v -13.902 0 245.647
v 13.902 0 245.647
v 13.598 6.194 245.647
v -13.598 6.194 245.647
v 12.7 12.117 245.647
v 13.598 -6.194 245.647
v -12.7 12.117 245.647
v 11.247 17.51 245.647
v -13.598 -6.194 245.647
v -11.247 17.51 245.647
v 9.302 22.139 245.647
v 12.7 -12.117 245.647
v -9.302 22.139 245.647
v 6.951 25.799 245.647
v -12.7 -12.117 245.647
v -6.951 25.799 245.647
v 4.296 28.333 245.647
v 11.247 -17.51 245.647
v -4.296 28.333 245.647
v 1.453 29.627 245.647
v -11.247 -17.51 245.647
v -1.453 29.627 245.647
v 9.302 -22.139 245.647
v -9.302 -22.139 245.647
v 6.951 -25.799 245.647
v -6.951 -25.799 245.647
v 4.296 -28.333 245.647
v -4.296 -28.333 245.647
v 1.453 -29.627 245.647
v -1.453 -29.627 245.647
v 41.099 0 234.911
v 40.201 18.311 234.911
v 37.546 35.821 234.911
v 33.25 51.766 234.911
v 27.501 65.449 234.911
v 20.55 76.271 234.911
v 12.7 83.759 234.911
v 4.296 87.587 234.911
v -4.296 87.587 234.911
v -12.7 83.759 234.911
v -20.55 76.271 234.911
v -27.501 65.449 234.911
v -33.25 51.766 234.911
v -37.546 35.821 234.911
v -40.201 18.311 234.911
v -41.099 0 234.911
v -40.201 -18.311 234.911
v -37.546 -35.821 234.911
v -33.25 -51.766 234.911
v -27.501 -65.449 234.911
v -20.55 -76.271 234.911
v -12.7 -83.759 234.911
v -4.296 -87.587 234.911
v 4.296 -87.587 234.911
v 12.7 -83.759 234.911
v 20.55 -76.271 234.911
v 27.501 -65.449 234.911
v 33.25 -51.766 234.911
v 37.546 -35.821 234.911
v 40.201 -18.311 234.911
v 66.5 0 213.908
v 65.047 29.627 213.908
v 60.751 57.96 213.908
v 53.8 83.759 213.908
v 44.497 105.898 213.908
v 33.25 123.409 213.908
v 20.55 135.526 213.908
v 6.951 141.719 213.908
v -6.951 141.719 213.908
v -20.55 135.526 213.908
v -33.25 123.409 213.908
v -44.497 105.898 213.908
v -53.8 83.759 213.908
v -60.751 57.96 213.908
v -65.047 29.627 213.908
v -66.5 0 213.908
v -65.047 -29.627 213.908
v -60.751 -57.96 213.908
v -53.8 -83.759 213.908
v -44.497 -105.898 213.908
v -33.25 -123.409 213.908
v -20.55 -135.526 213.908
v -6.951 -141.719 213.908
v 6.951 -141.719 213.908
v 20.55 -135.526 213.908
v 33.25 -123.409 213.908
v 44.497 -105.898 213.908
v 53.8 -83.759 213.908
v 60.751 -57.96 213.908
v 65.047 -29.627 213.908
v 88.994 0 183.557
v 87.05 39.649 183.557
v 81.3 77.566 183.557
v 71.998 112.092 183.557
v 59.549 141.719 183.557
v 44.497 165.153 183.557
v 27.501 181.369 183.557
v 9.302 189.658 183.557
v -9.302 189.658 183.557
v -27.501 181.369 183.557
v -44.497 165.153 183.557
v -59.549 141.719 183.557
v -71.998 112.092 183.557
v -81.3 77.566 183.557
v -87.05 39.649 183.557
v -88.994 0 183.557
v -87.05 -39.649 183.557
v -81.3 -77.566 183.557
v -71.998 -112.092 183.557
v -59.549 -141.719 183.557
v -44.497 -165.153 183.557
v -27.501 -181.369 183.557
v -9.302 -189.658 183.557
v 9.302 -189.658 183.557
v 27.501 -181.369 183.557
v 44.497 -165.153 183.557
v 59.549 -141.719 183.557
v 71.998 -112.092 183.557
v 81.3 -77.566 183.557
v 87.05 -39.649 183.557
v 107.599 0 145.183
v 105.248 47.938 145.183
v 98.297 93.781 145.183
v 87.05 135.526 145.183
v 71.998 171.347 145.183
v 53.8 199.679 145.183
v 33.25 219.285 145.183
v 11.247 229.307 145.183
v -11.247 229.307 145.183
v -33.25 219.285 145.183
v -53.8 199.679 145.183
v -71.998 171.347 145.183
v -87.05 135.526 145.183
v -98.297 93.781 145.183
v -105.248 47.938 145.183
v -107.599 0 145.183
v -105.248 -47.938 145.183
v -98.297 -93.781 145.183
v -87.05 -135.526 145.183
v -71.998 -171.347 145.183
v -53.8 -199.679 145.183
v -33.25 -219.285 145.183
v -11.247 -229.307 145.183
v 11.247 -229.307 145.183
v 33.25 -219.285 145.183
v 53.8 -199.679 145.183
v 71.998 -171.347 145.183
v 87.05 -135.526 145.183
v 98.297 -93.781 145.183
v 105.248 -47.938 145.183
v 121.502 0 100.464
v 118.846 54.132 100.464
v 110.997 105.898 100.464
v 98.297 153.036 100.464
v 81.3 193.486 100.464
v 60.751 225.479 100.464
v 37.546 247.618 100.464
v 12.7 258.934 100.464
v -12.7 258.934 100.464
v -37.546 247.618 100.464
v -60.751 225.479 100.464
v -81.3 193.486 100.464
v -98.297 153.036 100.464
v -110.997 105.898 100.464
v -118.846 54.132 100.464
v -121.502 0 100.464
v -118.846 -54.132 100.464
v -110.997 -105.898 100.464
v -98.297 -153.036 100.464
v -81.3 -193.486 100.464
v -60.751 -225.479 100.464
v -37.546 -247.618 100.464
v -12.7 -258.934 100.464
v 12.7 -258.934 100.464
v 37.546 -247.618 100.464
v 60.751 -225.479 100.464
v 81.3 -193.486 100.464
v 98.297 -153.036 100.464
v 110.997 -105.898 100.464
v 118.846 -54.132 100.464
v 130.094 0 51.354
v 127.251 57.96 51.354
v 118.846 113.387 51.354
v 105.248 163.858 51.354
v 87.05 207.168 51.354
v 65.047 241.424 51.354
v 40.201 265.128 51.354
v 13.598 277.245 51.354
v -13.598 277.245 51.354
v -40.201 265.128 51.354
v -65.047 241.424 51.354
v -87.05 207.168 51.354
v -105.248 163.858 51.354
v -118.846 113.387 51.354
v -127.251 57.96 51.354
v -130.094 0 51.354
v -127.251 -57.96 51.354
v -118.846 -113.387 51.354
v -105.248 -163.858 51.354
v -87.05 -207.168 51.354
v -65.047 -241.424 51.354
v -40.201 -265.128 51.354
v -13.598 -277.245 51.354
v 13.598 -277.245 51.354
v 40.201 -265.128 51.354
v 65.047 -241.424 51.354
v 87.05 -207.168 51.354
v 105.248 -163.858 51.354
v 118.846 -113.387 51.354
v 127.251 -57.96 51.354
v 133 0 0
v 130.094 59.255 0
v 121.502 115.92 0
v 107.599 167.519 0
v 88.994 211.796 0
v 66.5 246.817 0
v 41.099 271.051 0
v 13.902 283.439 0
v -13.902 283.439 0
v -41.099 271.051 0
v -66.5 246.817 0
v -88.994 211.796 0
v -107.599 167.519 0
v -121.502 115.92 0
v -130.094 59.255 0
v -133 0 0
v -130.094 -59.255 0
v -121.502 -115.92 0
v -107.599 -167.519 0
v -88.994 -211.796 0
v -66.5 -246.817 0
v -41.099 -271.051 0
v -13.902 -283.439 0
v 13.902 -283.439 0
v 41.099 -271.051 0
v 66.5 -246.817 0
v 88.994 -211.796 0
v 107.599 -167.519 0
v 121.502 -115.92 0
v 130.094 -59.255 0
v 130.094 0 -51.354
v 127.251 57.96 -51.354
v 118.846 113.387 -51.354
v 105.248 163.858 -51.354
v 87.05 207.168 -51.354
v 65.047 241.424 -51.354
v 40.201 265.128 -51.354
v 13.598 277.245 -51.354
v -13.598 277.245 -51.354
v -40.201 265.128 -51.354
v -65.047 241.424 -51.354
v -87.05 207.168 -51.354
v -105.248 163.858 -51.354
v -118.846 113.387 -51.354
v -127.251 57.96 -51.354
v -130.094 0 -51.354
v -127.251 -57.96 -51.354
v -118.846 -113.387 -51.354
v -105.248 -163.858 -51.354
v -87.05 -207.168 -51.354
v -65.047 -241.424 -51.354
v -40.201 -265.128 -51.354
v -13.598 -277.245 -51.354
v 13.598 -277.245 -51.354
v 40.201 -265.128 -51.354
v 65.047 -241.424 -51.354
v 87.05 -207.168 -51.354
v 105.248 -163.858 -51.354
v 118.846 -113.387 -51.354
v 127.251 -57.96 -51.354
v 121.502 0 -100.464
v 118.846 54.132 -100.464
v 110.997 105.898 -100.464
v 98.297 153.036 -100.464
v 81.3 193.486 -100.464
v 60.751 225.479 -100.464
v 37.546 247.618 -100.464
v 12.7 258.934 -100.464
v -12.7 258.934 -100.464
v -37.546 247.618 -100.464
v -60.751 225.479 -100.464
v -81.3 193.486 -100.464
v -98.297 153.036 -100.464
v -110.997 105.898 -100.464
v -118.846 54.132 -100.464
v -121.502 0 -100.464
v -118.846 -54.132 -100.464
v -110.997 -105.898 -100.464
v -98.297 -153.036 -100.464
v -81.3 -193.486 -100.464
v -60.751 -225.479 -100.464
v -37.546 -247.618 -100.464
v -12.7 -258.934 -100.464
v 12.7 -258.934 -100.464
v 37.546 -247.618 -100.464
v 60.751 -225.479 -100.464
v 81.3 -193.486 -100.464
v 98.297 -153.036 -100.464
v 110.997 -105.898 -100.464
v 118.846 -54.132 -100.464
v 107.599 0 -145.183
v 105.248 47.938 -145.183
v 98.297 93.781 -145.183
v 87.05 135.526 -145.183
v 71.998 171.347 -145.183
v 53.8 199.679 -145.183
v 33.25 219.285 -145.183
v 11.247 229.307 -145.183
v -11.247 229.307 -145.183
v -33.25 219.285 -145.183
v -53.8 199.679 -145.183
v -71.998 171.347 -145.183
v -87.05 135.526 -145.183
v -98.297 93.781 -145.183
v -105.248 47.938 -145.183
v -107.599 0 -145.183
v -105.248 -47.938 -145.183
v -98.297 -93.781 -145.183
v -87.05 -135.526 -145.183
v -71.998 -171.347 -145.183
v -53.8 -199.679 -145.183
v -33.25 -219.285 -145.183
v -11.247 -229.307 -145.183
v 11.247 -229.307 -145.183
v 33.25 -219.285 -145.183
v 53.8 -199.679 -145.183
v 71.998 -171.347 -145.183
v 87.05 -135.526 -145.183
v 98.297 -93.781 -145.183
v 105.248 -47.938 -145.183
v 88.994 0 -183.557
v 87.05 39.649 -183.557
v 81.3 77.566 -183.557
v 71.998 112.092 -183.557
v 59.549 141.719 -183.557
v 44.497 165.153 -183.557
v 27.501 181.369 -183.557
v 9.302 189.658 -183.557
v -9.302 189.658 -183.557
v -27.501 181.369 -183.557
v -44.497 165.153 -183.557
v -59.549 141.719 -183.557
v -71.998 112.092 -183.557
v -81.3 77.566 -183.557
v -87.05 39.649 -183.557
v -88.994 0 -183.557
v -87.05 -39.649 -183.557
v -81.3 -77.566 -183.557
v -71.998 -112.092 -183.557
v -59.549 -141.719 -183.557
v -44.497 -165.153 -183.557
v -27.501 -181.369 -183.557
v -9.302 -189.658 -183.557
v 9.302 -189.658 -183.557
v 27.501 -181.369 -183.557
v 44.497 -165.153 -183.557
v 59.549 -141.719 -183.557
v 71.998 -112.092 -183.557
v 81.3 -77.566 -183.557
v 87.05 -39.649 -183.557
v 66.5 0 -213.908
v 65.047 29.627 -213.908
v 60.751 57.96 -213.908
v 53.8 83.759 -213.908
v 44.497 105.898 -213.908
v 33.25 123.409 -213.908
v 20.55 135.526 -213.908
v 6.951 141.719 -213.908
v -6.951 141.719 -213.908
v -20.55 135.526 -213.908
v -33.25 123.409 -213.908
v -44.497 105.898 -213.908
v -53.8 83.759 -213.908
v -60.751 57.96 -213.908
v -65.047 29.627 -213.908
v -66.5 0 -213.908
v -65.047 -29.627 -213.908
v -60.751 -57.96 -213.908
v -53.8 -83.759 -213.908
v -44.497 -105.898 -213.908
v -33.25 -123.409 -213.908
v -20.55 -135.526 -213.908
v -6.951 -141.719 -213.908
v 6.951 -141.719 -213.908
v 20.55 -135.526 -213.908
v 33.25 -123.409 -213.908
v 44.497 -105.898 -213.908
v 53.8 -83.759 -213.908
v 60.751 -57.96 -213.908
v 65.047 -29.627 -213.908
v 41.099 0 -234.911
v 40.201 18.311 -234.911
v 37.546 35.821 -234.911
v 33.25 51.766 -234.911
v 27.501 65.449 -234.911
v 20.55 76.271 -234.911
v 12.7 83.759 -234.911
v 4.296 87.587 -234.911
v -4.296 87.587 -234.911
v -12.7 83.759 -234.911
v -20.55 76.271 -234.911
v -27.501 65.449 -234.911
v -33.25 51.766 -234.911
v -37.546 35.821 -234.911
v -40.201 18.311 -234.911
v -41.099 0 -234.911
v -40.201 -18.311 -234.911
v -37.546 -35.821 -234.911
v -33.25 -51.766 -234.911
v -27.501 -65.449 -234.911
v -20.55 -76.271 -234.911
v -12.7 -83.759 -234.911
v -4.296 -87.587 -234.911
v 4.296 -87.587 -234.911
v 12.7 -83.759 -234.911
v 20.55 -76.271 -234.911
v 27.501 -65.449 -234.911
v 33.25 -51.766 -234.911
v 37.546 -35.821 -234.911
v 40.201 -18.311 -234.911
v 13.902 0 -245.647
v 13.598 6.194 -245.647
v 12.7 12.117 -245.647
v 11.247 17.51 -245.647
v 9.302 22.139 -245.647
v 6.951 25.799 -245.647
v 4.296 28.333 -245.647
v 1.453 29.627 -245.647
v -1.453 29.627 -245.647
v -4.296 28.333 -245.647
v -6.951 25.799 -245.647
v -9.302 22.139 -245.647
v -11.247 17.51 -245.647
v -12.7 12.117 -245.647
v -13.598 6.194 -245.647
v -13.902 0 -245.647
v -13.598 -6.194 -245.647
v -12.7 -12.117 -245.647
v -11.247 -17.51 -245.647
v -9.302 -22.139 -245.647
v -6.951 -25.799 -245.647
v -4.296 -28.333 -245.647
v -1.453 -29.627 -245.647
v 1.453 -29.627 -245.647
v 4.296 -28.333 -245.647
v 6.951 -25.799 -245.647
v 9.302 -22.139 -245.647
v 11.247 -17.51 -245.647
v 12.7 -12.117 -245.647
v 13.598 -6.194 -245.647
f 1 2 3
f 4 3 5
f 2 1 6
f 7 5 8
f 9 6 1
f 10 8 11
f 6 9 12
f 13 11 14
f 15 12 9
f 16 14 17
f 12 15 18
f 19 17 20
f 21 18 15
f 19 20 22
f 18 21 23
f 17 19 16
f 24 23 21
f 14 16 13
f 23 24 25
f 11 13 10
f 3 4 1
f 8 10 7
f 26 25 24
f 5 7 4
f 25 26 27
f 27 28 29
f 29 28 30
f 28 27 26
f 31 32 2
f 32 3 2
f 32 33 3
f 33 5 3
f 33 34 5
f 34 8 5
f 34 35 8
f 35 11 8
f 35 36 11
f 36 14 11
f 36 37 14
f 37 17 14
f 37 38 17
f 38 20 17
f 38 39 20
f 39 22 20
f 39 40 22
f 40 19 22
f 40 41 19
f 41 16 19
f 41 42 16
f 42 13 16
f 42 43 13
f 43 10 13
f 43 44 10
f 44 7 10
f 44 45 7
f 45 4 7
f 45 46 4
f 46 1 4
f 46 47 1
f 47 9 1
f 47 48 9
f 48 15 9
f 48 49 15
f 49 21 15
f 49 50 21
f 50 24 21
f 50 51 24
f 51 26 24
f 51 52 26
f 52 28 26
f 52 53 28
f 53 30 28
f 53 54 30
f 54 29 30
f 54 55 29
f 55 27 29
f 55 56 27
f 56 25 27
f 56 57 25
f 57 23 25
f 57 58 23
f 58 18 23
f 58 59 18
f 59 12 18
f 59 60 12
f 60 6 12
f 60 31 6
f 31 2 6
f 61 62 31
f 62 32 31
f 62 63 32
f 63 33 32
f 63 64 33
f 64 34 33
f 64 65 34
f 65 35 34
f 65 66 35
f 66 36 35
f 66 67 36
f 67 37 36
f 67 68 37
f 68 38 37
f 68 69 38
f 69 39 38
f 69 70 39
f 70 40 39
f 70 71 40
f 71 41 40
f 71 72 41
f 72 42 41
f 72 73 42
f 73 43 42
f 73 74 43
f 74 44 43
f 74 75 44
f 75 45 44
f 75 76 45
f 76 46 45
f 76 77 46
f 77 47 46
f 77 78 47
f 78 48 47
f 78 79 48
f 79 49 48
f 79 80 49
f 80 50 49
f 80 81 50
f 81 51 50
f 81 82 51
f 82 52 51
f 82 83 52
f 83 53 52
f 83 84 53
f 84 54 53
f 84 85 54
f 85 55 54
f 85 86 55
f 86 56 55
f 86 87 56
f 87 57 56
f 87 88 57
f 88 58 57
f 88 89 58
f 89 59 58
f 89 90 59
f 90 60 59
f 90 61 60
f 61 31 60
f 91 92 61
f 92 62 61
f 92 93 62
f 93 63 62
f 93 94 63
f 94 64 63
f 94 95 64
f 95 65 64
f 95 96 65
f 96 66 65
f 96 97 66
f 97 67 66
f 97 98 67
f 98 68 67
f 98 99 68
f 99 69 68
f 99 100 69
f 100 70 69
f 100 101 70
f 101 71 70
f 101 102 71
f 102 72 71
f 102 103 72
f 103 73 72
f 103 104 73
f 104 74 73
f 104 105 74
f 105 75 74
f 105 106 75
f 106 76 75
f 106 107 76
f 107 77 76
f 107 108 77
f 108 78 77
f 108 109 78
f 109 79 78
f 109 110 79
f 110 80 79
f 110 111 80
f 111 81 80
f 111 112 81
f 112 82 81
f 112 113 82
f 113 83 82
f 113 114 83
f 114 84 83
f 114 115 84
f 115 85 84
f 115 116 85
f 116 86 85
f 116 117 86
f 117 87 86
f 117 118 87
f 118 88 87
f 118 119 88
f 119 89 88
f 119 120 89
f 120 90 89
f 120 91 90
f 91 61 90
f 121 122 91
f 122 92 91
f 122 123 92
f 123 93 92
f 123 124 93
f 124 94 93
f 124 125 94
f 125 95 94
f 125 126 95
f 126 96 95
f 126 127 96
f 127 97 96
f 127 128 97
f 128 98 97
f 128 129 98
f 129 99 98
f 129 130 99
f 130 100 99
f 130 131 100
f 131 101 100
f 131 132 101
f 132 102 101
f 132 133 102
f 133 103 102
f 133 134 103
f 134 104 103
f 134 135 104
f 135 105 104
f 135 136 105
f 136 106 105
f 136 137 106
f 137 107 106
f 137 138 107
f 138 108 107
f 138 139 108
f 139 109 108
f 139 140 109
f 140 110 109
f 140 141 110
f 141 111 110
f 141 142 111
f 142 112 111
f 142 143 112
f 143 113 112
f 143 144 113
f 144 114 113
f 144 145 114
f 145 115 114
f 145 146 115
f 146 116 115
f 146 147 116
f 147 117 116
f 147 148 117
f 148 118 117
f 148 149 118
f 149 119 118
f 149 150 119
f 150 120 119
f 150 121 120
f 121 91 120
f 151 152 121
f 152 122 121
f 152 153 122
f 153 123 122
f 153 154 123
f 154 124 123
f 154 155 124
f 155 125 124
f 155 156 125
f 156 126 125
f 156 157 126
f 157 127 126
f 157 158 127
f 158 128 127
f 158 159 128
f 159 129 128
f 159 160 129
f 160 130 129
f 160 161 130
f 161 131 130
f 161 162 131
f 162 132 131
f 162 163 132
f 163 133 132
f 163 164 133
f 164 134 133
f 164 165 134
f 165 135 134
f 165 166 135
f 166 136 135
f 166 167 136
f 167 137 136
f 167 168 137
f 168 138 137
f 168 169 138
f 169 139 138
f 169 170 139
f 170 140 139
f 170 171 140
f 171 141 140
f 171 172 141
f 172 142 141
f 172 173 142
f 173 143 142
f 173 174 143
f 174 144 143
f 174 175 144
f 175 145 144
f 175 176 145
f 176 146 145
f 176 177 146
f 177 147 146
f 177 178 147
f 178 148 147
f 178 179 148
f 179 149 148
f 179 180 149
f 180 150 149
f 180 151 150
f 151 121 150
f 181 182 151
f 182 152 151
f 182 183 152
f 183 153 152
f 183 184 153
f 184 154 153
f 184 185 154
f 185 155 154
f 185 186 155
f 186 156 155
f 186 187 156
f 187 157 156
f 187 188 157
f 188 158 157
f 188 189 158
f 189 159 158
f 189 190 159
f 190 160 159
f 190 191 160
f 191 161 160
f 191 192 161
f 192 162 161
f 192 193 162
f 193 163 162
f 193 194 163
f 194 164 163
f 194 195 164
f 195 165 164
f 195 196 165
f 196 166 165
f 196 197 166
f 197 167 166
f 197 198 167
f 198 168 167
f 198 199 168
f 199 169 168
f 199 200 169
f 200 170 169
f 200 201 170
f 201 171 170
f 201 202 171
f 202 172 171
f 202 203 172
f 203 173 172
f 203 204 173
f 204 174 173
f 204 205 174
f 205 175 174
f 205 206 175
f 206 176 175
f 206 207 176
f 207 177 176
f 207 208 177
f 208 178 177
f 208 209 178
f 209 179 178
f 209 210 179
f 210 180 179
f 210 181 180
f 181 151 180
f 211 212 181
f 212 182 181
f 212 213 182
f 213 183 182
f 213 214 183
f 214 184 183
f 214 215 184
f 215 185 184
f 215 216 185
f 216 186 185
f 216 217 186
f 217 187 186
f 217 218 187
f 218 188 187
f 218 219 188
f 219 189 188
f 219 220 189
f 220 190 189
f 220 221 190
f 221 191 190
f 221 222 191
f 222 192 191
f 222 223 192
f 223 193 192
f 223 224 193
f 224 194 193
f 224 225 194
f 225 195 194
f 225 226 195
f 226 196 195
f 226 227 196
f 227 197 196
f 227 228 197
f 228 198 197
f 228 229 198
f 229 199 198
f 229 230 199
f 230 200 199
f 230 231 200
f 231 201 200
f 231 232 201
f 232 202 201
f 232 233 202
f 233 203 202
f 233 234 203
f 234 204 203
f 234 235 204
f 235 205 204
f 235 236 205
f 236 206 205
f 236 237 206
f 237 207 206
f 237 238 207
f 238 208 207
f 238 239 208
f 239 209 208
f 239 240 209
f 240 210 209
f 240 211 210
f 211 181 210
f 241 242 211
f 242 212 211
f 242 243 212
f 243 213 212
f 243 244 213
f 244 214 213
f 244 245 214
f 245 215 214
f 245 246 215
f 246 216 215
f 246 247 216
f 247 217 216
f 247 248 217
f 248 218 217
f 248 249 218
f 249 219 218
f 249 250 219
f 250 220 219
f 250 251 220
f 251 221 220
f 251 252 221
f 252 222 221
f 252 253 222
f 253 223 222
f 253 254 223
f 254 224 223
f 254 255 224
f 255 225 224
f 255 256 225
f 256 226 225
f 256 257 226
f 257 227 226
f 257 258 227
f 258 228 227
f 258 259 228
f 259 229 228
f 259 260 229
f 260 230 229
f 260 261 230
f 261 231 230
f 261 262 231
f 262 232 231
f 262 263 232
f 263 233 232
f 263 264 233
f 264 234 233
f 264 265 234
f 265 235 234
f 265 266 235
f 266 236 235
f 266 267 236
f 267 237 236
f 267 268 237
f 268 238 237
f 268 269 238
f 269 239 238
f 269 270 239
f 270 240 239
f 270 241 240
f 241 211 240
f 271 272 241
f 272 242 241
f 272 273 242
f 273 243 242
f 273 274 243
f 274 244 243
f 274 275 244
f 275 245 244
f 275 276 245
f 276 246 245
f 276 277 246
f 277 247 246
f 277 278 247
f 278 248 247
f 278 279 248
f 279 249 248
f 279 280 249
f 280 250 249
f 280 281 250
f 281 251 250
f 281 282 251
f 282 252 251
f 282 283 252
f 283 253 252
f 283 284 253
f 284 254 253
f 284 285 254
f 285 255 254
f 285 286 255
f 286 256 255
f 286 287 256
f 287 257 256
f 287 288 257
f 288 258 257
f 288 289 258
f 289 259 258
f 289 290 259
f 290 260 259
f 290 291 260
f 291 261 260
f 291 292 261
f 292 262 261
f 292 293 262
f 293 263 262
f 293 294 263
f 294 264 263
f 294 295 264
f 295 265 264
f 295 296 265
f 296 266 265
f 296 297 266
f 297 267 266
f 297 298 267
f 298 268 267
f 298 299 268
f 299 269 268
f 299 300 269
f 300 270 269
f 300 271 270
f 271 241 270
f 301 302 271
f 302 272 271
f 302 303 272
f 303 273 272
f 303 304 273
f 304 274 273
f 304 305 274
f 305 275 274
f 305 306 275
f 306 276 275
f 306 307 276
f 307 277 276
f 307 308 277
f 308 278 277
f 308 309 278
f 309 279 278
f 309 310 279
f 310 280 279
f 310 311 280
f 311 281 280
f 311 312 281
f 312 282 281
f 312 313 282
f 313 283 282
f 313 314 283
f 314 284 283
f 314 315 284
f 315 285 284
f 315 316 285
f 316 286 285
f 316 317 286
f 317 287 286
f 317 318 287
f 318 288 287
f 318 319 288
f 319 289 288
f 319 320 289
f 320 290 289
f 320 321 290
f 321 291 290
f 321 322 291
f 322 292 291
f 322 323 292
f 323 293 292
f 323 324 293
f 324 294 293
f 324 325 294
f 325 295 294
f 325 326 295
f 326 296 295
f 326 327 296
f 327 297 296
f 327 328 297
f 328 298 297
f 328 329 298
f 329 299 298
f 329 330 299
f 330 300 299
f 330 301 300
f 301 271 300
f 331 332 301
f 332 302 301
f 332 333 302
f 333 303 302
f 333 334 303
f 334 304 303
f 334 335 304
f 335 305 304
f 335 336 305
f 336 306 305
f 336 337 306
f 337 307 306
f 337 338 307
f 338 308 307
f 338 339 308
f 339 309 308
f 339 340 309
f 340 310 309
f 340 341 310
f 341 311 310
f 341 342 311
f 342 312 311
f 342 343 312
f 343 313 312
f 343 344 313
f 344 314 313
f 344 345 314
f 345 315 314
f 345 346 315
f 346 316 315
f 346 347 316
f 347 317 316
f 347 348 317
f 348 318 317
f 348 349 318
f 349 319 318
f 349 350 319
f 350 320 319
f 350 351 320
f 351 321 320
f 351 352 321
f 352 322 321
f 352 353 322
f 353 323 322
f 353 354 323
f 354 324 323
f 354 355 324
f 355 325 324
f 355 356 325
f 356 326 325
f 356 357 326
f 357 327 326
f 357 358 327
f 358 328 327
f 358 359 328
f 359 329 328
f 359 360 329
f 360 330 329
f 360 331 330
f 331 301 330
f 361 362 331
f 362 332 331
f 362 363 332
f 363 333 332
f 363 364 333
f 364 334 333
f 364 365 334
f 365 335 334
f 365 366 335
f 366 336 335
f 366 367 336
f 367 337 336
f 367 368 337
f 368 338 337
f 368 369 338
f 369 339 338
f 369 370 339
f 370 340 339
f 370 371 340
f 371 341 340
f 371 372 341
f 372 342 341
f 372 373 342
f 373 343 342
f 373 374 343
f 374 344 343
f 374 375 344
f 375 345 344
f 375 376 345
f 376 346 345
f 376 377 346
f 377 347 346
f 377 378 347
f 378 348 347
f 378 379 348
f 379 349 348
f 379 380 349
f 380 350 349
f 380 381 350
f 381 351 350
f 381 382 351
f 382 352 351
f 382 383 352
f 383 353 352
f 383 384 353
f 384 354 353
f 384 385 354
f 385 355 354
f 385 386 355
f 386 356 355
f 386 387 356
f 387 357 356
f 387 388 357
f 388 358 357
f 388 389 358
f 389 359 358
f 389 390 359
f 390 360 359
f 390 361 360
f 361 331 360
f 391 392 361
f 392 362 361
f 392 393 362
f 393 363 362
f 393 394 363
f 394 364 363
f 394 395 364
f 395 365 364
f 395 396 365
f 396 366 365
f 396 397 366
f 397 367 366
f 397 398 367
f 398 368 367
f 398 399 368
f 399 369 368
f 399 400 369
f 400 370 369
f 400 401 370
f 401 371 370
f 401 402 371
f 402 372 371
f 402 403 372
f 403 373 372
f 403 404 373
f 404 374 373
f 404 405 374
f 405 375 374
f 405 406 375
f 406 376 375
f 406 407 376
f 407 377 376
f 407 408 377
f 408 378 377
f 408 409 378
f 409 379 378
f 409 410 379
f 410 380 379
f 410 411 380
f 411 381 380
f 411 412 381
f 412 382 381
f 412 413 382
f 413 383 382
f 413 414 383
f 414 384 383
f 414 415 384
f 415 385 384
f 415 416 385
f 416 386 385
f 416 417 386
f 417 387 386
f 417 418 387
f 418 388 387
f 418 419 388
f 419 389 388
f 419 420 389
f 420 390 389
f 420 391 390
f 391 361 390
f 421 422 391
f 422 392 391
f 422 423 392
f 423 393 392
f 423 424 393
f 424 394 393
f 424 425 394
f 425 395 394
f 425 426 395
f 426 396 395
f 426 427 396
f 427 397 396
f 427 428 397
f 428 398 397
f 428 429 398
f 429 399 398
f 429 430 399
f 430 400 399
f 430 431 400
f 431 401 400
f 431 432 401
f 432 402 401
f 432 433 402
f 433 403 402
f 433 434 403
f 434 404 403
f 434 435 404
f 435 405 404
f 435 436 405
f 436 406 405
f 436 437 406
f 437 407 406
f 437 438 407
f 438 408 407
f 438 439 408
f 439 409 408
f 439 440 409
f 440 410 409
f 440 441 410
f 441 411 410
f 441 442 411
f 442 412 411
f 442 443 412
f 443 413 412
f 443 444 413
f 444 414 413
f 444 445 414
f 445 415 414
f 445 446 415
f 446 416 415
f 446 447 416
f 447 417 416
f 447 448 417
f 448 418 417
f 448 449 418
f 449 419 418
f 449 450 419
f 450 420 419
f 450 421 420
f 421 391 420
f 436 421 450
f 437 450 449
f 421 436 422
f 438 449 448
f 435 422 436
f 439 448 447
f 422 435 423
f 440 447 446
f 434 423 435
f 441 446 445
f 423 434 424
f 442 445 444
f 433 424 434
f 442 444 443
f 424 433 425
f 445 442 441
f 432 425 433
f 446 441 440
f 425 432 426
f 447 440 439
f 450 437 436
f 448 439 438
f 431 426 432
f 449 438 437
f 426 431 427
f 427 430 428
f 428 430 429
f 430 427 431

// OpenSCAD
// Generated by SolidPython 1.0.1 on 2020-07-29 00:46:48


scale(v = [7, 15, 13]) {
	sphere(r = 19);
}
/***********************************************
*********      SolidPython code:      **********
************************************************
 
# import packages: SolidPython
from solid import *
from solid.utils import *
from itertools import chain, combinations, permutations


class Resize:

    def __init__(self, scad_file):
        self.scad_file = scad_file
        #self.scad_file = import_scad(scad_file)
        # cone/cylinder param:
        self.r1 = 0
        self.r2 = 0
        self.h = 0
        # rectangular prism param:
        self.w = 0
        self.l = 0
        # ellipse param:
        self.r = 0

    # import OpenScad code (file name corresponds to shape)


    # classify shape + parameters
    def assign(self, param1, param2, param3):
        if self.scad_file == 'cone.scad':
            self.r1 = param1
            self.r2 = param2
            self.h = param3
        elif self.scad_file == 'cylinder.scad':
            self.r1 = param1
            self.r2 = param2
            self.h = param3
        elif self.scad_file == 'rectangularPrism.scad':
            self.h = param1
            self.l = param2
            self.w = param3
        else:
            self.r = param1
            self.h = param2

    # resize parameters
    def iterate(self):
        x = range(3, 20, 2)
        i = 1
        if self.scad_file == 'cone.scad':
            tempList = list(permutations(x, 2))
            for temp in tempList:
                param1 = temp[0]
                param2 = temp[1]
                filepath = 'produced_scad_files/' + 'cone' + str(param1) + '_' + str(param2) + '_' + '.scad'
                scad_render_to_file(cylinder(h=param1, r1=param2, r2=0), filepath)

        elif self.scad_file == 'cylinder.scad':
            tempList = list(permutations(x, 3))
            for temp in tempList:
                param1 = temp[0]
                param2 = temp[1]
                filepath = 'produced_scad_files/' + 'cylinder' + str(param1) + '_' + str(param2) + '_' + '.scad'
                scad_render_to_file(cylinder(h=param1, r1=param2, r2=param2), filepath)

        elif self.scad_file == 'rectangularPrism.scad':
            tempList = list(permutations(x, 3))
            for temp in tempList:
                param1 = temp[0]
                param2 = temp[1]
                param3 = temp[2]
                filepath = 'produced_scad_files/' + 'rectangularPrism' + str(param1) + '_' + str(param2) + '_' + str(
                    param3) + '.scad'
                scad_render_to_file(cube(size=(param1, param2, param3)), filepath)

        elif self.scad_file == 'ellipse.scad':
            tempList = list(permutations(x, 4))
            for temp in tempList:
                param1 = temp[0]
                param2 = temp[1]
                param3 = temp[2]
                param4 = temp[3]
                filepath = 'produced_scad_files/' + 'ellipse' + str(param1) + '_' + str(param2) + '_' + str(param3) + '_' + str(param4) + '.scad'
                scad_render_to_file(scale([param1, param2, param3])(sphere(r=param4)), filepath)

    def render_to_scadfile(self):
        scad_render_to_file(scad, 'example.scad') 
 
************************************************/
